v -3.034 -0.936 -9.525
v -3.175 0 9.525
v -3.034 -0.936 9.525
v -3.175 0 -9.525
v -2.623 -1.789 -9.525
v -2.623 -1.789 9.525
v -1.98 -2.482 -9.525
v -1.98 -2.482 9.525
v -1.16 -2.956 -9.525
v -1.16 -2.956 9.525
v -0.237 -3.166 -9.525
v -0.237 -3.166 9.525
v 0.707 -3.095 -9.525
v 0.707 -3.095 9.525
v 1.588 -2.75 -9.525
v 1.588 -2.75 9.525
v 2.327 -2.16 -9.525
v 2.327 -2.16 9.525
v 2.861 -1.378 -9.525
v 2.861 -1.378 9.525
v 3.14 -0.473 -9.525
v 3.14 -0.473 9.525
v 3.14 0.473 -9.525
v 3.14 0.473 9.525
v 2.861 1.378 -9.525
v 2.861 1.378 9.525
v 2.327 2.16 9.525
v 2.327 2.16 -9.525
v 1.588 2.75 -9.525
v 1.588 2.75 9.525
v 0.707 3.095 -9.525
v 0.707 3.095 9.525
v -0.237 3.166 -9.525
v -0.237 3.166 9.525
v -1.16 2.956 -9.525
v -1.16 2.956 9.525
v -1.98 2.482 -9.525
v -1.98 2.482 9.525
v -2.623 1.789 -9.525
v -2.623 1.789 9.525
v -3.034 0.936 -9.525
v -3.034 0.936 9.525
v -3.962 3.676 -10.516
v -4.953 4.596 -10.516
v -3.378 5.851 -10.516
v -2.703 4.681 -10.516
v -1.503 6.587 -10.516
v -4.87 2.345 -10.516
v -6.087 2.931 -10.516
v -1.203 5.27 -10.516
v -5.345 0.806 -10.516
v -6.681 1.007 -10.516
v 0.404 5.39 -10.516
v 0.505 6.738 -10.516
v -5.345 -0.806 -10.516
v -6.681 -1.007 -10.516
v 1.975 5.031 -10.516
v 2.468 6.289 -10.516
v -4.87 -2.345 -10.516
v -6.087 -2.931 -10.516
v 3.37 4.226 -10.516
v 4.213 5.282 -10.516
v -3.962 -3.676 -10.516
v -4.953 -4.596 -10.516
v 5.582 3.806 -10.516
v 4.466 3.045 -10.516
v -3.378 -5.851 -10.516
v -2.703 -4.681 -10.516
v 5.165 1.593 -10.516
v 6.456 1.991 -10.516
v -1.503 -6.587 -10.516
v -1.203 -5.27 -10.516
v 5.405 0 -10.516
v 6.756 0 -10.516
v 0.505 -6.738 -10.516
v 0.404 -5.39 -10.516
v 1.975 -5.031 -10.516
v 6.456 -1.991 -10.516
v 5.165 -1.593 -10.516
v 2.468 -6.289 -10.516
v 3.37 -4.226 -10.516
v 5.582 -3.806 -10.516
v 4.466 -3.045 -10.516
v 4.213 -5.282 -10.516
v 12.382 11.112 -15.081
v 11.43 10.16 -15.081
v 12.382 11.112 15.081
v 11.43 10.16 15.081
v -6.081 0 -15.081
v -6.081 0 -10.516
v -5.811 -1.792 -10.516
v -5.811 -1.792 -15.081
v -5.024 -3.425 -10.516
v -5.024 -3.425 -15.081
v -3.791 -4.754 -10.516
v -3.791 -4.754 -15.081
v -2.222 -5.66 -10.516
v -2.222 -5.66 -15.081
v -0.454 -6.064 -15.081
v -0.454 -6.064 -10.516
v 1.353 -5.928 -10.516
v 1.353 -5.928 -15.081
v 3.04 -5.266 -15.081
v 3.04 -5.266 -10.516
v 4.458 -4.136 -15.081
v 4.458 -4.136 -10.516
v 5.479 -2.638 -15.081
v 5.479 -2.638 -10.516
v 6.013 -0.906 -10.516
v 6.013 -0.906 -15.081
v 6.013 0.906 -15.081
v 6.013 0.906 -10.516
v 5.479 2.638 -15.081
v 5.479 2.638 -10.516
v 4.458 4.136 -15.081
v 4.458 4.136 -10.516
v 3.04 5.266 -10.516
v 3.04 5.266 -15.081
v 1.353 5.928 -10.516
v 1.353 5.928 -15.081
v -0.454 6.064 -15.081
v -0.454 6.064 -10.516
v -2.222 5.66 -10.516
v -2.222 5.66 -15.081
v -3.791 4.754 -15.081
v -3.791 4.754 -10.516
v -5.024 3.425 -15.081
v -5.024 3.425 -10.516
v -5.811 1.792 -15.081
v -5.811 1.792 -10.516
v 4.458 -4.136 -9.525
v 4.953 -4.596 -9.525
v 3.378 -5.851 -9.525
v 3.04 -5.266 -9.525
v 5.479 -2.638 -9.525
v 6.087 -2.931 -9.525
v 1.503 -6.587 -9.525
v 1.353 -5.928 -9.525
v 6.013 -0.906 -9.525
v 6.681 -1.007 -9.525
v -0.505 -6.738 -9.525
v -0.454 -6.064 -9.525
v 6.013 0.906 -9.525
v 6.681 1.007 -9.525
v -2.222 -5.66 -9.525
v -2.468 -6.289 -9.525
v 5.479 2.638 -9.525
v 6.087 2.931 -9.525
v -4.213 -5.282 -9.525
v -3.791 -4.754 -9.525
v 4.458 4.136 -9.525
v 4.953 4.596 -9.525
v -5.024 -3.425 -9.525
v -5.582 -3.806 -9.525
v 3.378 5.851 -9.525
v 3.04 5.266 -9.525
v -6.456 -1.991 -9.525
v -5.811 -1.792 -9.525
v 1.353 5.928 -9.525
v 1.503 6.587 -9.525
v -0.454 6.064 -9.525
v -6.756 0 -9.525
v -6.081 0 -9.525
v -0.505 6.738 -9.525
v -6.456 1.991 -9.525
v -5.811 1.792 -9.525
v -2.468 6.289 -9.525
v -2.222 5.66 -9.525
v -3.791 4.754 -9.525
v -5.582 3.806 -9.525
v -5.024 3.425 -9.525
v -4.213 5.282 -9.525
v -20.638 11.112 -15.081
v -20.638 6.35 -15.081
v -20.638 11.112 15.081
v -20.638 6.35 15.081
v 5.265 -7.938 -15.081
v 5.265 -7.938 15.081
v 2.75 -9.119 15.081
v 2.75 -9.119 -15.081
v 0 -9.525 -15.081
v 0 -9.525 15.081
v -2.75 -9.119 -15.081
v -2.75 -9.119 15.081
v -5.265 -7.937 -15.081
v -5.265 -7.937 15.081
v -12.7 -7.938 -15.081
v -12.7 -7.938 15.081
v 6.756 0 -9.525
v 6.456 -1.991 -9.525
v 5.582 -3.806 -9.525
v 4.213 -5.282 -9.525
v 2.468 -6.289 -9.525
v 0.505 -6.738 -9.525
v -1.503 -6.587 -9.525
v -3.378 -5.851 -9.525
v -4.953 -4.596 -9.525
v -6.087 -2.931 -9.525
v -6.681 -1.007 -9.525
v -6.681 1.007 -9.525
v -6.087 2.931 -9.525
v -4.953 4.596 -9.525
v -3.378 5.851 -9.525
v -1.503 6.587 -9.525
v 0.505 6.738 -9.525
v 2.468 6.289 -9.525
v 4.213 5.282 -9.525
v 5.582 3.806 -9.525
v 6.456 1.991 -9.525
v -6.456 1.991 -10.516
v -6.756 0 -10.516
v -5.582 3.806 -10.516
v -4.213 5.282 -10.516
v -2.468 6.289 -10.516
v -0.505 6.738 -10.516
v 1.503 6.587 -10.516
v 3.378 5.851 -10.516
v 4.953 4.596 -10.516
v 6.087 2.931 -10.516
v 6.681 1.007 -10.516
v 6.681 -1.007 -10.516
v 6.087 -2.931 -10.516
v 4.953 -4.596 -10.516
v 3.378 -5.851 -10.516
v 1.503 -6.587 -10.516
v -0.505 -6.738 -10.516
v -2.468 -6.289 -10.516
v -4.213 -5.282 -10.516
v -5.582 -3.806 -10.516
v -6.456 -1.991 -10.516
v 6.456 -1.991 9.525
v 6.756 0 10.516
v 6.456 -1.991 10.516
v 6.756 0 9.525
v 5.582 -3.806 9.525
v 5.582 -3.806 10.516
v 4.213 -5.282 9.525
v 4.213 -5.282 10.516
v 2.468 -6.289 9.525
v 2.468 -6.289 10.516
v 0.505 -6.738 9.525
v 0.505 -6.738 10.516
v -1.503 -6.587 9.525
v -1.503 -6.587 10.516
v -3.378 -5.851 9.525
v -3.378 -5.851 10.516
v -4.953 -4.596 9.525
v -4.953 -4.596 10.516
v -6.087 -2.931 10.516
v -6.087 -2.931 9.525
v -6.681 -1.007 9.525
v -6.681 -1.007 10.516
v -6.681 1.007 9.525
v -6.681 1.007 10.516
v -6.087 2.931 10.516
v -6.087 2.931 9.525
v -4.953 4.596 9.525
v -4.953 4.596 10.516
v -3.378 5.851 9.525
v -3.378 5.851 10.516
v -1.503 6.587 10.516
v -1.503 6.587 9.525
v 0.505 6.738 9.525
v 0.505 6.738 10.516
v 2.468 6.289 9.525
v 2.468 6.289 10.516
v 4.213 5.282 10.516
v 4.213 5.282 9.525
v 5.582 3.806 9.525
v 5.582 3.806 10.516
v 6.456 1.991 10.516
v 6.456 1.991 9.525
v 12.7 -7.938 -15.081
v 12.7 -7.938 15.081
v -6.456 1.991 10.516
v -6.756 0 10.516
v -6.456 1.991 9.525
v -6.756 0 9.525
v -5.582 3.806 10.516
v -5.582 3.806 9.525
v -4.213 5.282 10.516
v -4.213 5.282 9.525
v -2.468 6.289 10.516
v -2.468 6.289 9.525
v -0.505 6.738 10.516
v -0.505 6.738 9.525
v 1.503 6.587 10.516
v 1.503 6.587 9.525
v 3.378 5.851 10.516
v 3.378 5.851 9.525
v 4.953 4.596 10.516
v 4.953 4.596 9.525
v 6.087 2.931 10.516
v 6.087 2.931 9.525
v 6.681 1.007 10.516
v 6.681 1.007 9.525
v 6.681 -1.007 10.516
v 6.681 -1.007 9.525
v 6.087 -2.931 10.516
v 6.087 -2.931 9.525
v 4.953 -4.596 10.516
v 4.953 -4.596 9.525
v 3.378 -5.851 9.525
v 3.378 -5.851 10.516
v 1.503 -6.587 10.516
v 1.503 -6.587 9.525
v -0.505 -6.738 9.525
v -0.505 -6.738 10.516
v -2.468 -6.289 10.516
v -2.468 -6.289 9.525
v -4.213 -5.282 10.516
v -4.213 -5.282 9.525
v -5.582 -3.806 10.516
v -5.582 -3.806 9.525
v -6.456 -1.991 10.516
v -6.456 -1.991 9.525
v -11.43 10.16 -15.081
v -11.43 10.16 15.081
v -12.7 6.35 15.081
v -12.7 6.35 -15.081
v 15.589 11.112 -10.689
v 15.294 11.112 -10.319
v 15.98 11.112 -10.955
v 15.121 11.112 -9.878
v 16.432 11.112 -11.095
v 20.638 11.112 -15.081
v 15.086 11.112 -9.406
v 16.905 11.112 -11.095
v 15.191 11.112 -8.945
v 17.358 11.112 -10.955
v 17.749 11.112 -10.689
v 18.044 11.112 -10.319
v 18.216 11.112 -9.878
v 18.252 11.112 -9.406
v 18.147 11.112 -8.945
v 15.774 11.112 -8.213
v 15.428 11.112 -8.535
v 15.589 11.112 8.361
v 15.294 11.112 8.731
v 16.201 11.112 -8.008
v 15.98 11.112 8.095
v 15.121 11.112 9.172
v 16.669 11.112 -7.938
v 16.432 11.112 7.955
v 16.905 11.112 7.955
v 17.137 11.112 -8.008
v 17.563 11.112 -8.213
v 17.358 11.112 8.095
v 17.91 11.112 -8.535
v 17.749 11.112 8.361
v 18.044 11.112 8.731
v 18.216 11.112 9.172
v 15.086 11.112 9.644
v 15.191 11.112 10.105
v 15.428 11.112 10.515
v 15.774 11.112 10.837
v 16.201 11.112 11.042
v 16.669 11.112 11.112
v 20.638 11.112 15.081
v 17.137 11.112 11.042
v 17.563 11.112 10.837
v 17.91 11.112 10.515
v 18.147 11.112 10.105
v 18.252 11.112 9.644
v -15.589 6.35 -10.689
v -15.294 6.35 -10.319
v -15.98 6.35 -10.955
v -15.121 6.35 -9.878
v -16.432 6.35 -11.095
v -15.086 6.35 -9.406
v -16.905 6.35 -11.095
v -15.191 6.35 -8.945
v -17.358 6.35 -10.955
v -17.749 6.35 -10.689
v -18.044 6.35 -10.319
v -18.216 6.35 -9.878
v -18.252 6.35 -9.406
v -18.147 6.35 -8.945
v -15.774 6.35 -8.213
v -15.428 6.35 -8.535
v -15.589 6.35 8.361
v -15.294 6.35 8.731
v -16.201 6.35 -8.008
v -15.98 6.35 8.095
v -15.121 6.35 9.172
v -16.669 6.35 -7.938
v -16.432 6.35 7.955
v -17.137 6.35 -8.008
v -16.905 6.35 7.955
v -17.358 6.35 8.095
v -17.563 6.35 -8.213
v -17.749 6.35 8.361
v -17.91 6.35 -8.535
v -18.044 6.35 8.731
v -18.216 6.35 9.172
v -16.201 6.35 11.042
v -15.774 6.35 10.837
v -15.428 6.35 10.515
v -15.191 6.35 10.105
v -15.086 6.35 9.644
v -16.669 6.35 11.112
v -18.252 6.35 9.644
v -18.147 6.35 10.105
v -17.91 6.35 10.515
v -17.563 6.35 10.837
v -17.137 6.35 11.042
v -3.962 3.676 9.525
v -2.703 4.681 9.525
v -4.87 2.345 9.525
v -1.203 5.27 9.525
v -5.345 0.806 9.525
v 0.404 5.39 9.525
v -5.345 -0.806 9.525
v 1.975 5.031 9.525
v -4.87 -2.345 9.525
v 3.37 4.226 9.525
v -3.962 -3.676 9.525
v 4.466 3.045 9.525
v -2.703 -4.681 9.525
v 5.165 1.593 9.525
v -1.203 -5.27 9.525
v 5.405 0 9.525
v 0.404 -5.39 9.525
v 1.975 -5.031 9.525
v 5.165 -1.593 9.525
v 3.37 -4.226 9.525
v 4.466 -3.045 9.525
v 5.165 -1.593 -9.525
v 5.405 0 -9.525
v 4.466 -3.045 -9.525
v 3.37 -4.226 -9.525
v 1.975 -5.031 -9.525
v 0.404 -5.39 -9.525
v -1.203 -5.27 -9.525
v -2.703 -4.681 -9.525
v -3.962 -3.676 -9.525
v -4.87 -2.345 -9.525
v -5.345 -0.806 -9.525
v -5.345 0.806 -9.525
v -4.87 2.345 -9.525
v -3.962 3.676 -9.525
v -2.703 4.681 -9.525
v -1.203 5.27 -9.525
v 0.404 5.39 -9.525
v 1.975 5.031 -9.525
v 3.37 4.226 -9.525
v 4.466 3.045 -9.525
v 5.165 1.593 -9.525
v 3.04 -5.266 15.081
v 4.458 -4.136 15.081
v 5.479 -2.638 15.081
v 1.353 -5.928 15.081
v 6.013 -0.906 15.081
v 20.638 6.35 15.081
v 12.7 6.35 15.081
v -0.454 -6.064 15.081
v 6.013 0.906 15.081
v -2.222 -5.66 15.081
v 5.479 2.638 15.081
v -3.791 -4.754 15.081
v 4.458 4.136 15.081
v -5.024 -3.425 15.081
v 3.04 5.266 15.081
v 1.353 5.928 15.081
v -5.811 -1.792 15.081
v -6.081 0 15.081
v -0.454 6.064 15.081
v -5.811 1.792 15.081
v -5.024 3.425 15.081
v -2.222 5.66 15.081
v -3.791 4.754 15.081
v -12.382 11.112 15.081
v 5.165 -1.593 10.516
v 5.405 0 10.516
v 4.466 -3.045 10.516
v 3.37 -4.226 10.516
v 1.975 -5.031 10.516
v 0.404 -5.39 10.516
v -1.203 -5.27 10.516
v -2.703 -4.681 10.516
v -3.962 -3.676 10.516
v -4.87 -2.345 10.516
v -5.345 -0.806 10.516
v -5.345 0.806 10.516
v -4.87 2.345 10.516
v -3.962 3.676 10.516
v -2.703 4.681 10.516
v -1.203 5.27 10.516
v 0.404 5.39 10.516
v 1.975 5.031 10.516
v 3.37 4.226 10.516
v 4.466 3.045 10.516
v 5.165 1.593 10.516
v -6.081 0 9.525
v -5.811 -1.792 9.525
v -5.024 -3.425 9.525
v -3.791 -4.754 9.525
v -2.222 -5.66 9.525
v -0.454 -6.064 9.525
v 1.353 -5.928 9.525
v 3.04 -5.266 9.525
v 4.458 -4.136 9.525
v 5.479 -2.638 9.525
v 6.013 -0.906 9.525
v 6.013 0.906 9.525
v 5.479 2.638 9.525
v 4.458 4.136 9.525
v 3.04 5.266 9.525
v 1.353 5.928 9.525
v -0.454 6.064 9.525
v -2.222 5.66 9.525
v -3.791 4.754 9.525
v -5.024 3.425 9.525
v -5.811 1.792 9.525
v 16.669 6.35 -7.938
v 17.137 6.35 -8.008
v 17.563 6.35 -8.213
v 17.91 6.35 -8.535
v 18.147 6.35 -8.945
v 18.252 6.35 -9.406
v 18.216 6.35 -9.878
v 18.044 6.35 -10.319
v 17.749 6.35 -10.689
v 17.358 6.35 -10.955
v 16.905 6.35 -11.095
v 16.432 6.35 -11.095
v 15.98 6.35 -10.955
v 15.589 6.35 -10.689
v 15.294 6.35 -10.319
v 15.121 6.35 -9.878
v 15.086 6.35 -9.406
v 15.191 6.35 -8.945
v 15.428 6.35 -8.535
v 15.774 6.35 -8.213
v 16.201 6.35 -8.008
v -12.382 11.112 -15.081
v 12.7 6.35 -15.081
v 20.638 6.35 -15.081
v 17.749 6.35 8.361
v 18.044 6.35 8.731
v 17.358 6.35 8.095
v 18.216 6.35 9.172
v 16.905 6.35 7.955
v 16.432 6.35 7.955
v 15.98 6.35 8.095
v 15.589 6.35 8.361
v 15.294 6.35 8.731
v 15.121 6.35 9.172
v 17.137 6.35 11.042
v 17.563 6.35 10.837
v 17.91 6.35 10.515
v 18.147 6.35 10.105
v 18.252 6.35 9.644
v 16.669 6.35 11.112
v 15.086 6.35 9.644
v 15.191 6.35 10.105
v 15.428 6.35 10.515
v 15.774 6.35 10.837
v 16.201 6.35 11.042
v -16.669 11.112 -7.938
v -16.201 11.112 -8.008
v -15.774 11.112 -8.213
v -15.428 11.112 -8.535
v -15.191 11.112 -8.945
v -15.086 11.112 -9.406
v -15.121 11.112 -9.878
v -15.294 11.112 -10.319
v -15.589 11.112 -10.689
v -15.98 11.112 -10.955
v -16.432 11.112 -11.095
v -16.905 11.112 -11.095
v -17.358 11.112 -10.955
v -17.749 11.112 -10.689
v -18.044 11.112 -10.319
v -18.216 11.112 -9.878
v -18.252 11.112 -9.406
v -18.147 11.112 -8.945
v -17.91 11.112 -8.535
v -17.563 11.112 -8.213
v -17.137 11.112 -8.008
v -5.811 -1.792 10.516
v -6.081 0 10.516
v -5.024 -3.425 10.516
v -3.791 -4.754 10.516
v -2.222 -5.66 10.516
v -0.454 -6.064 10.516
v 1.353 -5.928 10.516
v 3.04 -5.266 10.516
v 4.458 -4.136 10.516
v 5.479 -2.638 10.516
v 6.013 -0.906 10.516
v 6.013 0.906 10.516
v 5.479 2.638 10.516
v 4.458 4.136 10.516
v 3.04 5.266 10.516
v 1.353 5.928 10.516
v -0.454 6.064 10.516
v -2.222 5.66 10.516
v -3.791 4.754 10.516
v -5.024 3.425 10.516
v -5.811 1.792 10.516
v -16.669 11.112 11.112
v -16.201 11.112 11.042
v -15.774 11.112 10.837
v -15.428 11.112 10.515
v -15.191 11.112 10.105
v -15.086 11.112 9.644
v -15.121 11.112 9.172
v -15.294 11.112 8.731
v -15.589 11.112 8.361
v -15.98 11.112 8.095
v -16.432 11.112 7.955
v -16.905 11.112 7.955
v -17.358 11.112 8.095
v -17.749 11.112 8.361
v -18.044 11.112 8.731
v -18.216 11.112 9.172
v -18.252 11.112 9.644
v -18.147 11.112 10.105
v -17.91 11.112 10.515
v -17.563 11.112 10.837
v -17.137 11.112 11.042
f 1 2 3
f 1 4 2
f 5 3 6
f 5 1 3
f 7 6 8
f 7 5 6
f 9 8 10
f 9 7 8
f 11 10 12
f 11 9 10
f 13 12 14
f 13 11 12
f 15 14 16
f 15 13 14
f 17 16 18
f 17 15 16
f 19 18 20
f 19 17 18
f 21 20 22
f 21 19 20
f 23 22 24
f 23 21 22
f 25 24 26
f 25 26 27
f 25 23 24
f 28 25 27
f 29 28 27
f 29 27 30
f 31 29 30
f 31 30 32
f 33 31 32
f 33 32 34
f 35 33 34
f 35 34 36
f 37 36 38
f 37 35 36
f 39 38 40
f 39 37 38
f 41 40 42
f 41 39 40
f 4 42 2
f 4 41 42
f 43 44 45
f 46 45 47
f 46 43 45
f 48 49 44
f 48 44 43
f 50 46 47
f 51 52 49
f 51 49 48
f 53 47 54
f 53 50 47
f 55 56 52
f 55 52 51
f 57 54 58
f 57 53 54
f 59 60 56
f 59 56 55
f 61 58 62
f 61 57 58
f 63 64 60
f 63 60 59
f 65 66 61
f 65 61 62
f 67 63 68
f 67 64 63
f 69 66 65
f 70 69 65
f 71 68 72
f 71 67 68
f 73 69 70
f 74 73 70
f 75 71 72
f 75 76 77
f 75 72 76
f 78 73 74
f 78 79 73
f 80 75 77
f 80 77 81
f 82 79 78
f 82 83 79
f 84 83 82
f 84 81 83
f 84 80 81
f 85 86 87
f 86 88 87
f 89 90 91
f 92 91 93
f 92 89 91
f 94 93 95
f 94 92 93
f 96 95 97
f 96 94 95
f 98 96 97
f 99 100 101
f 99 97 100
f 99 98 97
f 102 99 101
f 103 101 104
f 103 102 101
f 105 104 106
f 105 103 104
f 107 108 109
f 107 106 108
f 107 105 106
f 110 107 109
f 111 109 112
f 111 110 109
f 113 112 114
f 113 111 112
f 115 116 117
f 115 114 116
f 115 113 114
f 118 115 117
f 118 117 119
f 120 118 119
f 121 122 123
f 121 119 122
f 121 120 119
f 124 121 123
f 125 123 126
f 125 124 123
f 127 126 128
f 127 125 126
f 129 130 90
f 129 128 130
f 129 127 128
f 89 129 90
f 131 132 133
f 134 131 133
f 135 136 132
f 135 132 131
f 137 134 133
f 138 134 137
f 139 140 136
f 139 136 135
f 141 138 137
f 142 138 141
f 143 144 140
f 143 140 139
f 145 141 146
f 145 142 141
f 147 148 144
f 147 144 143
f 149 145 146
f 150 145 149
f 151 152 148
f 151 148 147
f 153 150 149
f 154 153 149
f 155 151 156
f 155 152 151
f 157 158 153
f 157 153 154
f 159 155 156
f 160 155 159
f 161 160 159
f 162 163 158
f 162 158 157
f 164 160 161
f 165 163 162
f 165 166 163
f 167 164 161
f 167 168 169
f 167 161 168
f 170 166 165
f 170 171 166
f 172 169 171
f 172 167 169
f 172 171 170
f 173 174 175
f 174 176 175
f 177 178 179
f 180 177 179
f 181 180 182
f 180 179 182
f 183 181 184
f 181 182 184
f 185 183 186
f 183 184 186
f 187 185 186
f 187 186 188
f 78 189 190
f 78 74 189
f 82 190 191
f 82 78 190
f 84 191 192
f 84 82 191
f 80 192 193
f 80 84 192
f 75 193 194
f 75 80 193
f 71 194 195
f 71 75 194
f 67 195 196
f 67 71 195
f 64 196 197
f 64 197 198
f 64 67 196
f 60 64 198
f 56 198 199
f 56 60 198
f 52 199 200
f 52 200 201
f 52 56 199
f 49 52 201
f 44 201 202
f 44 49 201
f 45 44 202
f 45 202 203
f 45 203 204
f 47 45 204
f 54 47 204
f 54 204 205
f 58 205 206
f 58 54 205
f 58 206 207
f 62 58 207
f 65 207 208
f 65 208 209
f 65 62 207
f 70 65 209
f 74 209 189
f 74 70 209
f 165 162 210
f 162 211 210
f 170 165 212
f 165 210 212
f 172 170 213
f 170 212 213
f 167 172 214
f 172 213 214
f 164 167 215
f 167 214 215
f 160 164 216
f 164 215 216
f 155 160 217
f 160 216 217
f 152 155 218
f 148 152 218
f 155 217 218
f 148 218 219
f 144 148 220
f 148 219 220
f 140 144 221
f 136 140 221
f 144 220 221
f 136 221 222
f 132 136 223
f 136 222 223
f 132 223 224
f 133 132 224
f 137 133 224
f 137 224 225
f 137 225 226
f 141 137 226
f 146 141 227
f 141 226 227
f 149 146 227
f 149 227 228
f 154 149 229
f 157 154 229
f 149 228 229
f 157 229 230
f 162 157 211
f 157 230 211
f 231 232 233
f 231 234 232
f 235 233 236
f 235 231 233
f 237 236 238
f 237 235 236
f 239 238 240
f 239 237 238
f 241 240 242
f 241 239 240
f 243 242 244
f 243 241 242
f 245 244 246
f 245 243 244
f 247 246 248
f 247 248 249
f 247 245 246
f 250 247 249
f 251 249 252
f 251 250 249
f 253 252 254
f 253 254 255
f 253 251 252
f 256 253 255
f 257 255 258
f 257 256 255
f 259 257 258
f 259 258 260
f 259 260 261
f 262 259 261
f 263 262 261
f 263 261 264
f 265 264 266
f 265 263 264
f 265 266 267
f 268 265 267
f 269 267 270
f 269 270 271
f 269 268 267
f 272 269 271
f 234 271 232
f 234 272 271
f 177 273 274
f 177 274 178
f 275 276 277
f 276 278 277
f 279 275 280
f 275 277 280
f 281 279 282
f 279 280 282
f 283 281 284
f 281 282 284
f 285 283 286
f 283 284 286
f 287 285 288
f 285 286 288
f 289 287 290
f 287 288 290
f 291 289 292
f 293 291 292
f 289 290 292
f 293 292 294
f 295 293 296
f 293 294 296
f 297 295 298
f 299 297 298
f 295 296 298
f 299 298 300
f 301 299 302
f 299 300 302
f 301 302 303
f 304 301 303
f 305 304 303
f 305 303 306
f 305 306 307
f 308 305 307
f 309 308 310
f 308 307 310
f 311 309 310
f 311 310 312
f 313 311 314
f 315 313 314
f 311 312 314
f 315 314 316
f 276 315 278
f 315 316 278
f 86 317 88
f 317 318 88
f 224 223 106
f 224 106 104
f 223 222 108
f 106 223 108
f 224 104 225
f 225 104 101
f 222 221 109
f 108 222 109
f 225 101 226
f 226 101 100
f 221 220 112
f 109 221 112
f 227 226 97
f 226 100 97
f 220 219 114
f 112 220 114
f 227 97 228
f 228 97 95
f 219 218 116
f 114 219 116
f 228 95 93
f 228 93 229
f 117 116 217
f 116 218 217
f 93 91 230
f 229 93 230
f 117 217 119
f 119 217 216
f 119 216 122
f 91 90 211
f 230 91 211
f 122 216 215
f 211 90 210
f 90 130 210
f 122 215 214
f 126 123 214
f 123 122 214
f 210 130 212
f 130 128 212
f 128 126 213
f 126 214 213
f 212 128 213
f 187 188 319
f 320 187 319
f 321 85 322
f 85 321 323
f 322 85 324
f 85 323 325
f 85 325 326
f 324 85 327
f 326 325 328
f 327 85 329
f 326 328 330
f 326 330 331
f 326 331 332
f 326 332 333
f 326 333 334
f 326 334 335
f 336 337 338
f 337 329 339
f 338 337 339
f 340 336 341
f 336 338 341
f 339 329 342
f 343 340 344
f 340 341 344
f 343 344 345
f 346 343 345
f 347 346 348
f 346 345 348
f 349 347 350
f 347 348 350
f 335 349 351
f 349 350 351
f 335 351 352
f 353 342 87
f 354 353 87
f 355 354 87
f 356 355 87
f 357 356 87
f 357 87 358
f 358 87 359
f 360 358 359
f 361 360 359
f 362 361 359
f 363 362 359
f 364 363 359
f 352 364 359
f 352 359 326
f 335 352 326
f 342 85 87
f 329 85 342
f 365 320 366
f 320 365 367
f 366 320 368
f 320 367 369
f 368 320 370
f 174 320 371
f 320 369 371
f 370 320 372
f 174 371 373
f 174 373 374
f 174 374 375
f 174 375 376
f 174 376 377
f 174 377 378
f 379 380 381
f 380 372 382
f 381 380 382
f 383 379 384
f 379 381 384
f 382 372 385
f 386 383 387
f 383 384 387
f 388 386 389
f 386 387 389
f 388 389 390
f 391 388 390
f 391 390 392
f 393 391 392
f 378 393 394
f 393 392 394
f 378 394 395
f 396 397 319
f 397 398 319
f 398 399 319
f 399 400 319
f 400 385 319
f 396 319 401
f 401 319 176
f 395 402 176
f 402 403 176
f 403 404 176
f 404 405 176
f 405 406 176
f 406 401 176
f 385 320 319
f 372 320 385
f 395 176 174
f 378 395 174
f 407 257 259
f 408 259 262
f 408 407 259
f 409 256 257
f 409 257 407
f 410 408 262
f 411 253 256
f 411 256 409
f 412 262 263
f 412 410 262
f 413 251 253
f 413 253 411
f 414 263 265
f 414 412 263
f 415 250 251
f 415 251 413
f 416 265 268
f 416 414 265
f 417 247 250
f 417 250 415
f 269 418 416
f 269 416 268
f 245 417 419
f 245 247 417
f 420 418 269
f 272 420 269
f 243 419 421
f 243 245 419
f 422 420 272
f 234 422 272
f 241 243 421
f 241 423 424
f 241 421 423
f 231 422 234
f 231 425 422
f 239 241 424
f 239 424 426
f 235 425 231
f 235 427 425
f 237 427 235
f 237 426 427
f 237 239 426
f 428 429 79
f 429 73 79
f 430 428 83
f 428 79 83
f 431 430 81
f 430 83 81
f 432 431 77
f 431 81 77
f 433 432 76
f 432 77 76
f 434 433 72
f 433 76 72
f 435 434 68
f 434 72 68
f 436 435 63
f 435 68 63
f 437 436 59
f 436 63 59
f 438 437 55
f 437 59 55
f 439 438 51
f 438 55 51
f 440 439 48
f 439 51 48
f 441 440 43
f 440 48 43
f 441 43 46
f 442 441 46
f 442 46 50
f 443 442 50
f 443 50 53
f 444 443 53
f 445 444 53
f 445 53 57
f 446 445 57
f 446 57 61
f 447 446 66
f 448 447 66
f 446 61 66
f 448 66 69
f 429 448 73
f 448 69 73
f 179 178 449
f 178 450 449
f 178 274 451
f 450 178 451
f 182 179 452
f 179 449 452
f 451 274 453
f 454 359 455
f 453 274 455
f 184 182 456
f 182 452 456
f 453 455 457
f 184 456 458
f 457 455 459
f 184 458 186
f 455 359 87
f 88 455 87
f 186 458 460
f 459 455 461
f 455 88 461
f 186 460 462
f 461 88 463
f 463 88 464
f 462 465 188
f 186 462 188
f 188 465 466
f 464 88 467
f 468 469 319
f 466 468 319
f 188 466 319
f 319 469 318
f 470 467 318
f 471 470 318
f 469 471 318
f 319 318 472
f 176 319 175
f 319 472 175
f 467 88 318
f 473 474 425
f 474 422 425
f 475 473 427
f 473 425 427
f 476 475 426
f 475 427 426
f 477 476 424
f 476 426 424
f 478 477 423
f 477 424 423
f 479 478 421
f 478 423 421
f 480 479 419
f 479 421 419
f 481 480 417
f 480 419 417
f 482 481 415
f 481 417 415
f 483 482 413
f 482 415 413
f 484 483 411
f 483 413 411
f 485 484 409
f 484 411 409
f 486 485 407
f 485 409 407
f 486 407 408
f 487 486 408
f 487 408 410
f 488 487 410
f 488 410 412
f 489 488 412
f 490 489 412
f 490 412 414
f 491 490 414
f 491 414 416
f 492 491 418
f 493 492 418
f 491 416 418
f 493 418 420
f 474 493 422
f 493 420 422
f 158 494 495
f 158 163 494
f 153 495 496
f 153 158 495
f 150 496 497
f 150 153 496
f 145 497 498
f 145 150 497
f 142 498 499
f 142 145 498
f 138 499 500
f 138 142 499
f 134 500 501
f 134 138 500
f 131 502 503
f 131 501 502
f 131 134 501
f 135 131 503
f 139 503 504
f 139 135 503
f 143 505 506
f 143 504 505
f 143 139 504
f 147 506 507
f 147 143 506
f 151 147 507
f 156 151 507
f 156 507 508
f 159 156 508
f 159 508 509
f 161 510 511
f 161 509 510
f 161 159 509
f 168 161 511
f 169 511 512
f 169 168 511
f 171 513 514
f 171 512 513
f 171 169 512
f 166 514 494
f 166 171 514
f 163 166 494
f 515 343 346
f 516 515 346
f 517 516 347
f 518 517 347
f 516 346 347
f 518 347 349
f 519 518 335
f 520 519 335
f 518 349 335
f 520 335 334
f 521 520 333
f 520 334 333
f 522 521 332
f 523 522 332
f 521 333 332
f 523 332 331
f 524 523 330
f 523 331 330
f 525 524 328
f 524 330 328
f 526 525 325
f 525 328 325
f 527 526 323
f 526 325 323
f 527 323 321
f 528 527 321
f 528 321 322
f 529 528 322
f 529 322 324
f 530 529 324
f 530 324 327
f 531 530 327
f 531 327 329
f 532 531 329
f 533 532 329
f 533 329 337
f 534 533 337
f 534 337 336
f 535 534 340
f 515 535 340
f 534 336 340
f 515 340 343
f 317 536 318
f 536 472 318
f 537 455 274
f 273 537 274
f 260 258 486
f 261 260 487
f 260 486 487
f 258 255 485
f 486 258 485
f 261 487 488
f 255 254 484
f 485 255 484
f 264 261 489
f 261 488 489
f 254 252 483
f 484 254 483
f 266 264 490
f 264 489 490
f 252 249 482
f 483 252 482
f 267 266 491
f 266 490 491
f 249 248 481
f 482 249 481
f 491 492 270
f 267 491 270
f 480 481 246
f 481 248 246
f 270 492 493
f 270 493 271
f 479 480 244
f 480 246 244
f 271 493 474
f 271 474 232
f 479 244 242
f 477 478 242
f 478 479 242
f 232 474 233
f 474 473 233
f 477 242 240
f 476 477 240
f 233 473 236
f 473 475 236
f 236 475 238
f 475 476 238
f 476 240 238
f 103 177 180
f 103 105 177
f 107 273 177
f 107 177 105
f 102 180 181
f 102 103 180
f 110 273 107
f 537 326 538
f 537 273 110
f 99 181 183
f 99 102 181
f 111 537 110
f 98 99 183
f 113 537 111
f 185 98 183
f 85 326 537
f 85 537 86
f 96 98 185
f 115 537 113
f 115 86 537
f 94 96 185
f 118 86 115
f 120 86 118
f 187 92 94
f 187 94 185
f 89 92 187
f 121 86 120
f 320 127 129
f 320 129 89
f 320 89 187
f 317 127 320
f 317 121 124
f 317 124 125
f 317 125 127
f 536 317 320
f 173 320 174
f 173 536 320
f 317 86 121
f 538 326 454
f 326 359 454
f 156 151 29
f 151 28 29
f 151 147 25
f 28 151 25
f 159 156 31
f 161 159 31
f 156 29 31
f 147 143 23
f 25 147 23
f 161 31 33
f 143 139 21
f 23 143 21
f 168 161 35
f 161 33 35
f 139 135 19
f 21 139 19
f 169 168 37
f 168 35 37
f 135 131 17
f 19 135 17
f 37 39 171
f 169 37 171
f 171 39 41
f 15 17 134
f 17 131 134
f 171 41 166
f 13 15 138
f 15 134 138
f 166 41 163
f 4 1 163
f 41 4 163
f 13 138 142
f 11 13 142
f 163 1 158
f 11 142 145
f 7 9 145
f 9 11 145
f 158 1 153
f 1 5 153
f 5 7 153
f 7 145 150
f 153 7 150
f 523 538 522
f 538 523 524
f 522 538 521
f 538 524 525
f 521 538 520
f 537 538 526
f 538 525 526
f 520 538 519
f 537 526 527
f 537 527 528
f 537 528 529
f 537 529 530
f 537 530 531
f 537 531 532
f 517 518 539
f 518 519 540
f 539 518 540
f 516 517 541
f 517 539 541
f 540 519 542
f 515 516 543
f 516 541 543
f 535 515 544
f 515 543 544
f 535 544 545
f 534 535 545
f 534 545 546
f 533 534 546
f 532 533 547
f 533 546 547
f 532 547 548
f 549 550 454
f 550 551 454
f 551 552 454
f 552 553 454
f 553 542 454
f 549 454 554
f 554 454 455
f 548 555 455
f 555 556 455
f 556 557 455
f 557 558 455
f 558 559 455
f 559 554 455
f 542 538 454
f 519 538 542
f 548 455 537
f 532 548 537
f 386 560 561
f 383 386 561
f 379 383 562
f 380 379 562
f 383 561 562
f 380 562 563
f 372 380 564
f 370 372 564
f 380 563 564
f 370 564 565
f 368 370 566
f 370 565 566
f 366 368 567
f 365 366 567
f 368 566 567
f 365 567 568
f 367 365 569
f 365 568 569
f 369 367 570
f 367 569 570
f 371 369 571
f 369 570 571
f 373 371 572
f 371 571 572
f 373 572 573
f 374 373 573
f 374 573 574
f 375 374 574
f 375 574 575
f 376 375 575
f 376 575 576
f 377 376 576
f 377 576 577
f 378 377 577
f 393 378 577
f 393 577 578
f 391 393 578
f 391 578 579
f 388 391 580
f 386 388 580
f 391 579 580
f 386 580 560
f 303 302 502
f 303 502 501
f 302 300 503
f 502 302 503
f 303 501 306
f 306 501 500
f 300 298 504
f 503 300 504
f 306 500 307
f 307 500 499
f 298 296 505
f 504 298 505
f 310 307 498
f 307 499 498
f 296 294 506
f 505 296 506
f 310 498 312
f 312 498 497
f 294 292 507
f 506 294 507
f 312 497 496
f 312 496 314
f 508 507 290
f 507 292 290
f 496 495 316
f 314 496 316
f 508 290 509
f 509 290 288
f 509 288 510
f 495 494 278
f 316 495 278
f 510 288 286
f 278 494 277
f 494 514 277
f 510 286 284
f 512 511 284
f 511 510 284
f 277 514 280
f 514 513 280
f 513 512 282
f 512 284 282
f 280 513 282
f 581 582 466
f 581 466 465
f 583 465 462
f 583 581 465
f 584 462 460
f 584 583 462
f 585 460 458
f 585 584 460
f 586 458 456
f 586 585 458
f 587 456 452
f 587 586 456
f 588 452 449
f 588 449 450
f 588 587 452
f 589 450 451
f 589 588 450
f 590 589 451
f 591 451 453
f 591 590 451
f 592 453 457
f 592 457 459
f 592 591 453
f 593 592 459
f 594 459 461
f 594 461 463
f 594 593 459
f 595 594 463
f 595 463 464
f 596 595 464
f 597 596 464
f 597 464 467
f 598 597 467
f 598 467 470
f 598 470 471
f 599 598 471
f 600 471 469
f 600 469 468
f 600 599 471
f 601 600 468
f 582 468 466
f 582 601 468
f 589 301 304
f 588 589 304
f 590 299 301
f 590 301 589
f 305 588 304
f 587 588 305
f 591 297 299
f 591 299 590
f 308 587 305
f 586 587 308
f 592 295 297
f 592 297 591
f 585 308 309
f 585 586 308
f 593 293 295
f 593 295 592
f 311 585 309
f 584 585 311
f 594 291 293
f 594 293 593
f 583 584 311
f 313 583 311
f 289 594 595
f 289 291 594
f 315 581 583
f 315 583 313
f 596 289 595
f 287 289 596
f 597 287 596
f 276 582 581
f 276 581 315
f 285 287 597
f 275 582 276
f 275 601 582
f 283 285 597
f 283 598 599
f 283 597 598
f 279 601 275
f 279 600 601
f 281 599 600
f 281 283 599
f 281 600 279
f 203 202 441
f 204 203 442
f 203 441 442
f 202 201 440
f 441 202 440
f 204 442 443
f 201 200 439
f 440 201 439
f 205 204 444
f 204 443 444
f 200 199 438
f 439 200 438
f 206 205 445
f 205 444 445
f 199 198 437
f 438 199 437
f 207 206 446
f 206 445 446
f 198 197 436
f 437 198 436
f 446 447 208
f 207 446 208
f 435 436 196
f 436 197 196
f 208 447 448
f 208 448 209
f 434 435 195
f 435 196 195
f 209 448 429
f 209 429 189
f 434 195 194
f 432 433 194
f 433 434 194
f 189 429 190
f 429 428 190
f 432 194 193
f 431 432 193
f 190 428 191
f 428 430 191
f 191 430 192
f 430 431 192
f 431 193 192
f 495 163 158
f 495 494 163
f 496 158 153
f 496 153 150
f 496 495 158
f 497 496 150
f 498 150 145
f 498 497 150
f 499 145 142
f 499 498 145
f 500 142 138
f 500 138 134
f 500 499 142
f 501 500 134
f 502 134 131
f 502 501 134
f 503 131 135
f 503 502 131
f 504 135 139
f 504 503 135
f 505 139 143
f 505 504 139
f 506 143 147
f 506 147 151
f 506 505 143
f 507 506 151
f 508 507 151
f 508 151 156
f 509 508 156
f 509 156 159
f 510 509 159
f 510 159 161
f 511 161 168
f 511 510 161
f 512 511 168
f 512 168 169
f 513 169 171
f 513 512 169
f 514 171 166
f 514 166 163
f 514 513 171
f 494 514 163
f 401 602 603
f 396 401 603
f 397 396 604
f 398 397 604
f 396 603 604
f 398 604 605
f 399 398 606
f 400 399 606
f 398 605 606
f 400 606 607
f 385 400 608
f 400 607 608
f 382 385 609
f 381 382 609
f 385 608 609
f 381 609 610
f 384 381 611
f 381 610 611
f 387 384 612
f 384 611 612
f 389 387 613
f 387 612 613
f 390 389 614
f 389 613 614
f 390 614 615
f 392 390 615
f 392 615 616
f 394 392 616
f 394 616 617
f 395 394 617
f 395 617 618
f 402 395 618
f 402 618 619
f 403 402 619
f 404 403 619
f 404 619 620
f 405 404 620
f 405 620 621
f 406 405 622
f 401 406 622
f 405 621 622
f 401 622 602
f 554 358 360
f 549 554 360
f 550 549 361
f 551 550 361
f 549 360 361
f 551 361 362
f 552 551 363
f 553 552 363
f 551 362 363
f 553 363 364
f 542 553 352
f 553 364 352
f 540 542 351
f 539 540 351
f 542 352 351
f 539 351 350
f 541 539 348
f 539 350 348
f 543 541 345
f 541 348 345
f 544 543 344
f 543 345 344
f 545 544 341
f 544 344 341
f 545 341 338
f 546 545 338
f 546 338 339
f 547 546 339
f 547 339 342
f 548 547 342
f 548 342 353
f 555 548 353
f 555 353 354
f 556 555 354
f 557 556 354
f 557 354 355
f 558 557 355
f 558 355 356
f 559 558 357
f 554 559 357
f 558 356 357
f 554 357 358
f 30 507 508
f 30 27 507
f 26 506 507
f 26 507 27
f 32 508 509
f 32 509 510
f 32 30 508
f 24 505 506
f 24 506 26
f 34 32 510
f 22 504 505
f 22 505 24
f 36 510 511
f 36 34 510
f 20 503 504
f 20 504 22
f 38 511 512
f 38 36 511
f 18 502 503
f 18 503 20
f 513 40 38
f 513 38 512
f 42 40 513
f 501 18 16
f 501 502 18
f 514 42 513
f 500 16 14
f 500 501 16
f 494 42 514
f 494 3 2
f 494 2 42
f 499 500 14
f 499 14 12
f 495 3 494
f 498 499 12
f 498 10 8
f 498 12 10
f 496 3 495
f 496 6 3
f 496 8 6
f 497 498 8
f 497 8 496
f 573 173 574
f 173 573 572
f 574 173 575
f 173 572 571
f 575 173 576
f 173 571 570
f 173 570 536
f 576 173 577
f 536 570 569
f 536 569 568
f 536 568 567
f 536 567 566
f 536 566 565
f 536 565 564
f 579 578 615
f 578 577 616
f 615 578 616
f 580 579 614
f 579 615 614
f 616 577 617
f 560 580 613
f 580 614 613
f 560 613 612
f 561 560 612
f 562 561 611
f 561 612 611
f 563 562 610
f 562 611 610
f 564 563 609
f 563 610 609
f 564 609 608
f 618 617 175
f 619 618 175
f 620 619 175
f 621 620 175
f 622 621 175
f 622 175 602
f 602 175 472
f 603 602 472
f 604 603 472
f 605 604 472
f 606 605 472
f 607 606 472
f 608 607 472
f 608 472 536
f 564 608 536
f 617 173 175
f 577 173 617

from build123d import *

# Parameters (mm, degrees)
SKETCH1_R            = 6.08076
MAIN_BODY_DEPTH      = 15.08125
SKETCH3_R            = 1.5875
MOUNTING_HOLES_DEPTH = 4.7625
SKETCH8_R            = 6.08076
SKETCH8_R_2          = 3.175
INTERIOR_DEPTH       = 9.525
GROOVES_2_W          = 0.9906
GROOVES_2_H          = 1.35128
GROOVES_2_2_W        = 0.9906
GROOVES_2_2_H        = 1.35128


with BuildPart() as part:
    # Sketch1 → Main Body (new, symmetric)
    with BuildSketch(Plane.XY):
        with BuildLine():
            Line((-12.7, 6.35), (-20.6375, 6.35))
            Line((-20.6375, 6.35), (-20.6375, 11.1125))
            Line((-20.6375, 11.1125), (-12.3825, 11.1125))
            Line((-12.3825, 11.1125), (-11.43, 10.16))
            Line((-11.43, 10.16), (11.43, 10.16))
            Line((11.43, 10.16), (12.3825, 11.1125))
            Line((12.3825, 11.1125), (20.6375, 11.1125))
            Line((20.6375, 11.1125), (20.6375, 6.35))
            Line((20.6375, 6.35), (12.7, 6.35))
            Line((12.7, 6.35), (12.7, -7.9375))
            Line((12.7, -7.9375), (5.265141855, -7.9375))
            ThreePointArc((5.265141855, -7.9375), (0, -9.525), (-5.265141855, -7.9375))
            Line((-5.265141855, -7.9375), (-12.7, -7.9375))
            Line((-12.7, -7.9375), (-12.7, 6.35))
        make_face()
        with Locations(Location((0, 0, 0), (0, 0, 180))):
            Circle(SKETCH1_R, mode=Mode.SUBTRACT)
    extrude(amount=MAIN_BODY_DEPTH, both=True)

    # Sketch3 → Mounting Holes (cut)
    with BuildSketch(Plane(origin=(0, 11.1125, 0), x_dir=(1, 0, 0), z_dir=(0, 1, 0))):
        with Locations(Location((-16.66875, 9.525, 0), (0, 0, 270))):
            Circle(SKETCH3_R)
        with Locations(Location((16.66875, 9.525, 0), (0, 0, 270))):
            Circle(SKETCH3_R)
        with Locations(Location((16.66875, -9.525, 0), (0, 0, 270))):
            Circle(SKETCH3_R)
        with Locations(Location((-16.66875, -9.525, 0), (0, 0, 270))):
            Circle(SKETCH3_R)
    extrude(amount=-MOUNTING_HOLES_DEPTH, mode=Mode.SUBTRACT)

    # Grooves 2 → Grooves (revolve, cut)
    with BuildSketch(Plane(origin=(0, 0, 0), x_dir=(0, 0, -1), z_dir=(1, 0, 0)), mode=Mode.PRIVATE) as grooves_sk:
        with Locations((10.0203, -6.08076)):
            Rectangle(GROOVES_2_W, GROOVES_2_H)
        with Locations((-10.0203, -6.08076)):
            Rectangle(GROOVES_2_W, GROOVES_2_H)
    revolve(grooves_sk.sketch.rotate(Axis((0, 0, 9.525), (0, 0, -1)), 90), axis=Axis((0, 0, 9.525), (0, 0, -1)), mode=Mode.SUBTRACT)


with BuildPart() as body_2:
    # Sketch8 → Interior (new, symmetric)
    with BuildSketch(Plane.XY):
        with Locations(Location((0, 0, 0), (0, 0, 180))):
            Circle(SKETCH8_R)
        with Locations(Location((0, 0, 0), (0, 0, 180))):
            Circle(SKETCH8_R_2, mode=Mode.SUBTRACT)
    extrude(amount=INTERIOR_DEPTH, both=True)


with BuildPart() as body_3:
    # Grooves_2 2 → Retaining Ring (revolve)
    with BuildSketch(Plane(origin=(0, 0, 0), x_dir=(0, 0, -1), z_dir=(1, 0, 0)), mode=Mode.PRIVATE) as retaining_ring_sk:
        with Locations((10.0203, -6.08076)):
            Rectangle(GROOVES_2_2_W, GROOVES_2_2_H)
        with Locations((-10.0203, -6.08076)):
            Rectangle(GROOVES_2_2_W, GROOVES_2_2_H)
    revolve(retaining_ring_sk.sketch.rotate(Axis((0, 0, 9.525), (0, 0, -1)), 270), axis=Axis((0, 0, 9.525), (0, 0, -1)))


solid = Compound([part.part, body_2.part, body_3.part])
